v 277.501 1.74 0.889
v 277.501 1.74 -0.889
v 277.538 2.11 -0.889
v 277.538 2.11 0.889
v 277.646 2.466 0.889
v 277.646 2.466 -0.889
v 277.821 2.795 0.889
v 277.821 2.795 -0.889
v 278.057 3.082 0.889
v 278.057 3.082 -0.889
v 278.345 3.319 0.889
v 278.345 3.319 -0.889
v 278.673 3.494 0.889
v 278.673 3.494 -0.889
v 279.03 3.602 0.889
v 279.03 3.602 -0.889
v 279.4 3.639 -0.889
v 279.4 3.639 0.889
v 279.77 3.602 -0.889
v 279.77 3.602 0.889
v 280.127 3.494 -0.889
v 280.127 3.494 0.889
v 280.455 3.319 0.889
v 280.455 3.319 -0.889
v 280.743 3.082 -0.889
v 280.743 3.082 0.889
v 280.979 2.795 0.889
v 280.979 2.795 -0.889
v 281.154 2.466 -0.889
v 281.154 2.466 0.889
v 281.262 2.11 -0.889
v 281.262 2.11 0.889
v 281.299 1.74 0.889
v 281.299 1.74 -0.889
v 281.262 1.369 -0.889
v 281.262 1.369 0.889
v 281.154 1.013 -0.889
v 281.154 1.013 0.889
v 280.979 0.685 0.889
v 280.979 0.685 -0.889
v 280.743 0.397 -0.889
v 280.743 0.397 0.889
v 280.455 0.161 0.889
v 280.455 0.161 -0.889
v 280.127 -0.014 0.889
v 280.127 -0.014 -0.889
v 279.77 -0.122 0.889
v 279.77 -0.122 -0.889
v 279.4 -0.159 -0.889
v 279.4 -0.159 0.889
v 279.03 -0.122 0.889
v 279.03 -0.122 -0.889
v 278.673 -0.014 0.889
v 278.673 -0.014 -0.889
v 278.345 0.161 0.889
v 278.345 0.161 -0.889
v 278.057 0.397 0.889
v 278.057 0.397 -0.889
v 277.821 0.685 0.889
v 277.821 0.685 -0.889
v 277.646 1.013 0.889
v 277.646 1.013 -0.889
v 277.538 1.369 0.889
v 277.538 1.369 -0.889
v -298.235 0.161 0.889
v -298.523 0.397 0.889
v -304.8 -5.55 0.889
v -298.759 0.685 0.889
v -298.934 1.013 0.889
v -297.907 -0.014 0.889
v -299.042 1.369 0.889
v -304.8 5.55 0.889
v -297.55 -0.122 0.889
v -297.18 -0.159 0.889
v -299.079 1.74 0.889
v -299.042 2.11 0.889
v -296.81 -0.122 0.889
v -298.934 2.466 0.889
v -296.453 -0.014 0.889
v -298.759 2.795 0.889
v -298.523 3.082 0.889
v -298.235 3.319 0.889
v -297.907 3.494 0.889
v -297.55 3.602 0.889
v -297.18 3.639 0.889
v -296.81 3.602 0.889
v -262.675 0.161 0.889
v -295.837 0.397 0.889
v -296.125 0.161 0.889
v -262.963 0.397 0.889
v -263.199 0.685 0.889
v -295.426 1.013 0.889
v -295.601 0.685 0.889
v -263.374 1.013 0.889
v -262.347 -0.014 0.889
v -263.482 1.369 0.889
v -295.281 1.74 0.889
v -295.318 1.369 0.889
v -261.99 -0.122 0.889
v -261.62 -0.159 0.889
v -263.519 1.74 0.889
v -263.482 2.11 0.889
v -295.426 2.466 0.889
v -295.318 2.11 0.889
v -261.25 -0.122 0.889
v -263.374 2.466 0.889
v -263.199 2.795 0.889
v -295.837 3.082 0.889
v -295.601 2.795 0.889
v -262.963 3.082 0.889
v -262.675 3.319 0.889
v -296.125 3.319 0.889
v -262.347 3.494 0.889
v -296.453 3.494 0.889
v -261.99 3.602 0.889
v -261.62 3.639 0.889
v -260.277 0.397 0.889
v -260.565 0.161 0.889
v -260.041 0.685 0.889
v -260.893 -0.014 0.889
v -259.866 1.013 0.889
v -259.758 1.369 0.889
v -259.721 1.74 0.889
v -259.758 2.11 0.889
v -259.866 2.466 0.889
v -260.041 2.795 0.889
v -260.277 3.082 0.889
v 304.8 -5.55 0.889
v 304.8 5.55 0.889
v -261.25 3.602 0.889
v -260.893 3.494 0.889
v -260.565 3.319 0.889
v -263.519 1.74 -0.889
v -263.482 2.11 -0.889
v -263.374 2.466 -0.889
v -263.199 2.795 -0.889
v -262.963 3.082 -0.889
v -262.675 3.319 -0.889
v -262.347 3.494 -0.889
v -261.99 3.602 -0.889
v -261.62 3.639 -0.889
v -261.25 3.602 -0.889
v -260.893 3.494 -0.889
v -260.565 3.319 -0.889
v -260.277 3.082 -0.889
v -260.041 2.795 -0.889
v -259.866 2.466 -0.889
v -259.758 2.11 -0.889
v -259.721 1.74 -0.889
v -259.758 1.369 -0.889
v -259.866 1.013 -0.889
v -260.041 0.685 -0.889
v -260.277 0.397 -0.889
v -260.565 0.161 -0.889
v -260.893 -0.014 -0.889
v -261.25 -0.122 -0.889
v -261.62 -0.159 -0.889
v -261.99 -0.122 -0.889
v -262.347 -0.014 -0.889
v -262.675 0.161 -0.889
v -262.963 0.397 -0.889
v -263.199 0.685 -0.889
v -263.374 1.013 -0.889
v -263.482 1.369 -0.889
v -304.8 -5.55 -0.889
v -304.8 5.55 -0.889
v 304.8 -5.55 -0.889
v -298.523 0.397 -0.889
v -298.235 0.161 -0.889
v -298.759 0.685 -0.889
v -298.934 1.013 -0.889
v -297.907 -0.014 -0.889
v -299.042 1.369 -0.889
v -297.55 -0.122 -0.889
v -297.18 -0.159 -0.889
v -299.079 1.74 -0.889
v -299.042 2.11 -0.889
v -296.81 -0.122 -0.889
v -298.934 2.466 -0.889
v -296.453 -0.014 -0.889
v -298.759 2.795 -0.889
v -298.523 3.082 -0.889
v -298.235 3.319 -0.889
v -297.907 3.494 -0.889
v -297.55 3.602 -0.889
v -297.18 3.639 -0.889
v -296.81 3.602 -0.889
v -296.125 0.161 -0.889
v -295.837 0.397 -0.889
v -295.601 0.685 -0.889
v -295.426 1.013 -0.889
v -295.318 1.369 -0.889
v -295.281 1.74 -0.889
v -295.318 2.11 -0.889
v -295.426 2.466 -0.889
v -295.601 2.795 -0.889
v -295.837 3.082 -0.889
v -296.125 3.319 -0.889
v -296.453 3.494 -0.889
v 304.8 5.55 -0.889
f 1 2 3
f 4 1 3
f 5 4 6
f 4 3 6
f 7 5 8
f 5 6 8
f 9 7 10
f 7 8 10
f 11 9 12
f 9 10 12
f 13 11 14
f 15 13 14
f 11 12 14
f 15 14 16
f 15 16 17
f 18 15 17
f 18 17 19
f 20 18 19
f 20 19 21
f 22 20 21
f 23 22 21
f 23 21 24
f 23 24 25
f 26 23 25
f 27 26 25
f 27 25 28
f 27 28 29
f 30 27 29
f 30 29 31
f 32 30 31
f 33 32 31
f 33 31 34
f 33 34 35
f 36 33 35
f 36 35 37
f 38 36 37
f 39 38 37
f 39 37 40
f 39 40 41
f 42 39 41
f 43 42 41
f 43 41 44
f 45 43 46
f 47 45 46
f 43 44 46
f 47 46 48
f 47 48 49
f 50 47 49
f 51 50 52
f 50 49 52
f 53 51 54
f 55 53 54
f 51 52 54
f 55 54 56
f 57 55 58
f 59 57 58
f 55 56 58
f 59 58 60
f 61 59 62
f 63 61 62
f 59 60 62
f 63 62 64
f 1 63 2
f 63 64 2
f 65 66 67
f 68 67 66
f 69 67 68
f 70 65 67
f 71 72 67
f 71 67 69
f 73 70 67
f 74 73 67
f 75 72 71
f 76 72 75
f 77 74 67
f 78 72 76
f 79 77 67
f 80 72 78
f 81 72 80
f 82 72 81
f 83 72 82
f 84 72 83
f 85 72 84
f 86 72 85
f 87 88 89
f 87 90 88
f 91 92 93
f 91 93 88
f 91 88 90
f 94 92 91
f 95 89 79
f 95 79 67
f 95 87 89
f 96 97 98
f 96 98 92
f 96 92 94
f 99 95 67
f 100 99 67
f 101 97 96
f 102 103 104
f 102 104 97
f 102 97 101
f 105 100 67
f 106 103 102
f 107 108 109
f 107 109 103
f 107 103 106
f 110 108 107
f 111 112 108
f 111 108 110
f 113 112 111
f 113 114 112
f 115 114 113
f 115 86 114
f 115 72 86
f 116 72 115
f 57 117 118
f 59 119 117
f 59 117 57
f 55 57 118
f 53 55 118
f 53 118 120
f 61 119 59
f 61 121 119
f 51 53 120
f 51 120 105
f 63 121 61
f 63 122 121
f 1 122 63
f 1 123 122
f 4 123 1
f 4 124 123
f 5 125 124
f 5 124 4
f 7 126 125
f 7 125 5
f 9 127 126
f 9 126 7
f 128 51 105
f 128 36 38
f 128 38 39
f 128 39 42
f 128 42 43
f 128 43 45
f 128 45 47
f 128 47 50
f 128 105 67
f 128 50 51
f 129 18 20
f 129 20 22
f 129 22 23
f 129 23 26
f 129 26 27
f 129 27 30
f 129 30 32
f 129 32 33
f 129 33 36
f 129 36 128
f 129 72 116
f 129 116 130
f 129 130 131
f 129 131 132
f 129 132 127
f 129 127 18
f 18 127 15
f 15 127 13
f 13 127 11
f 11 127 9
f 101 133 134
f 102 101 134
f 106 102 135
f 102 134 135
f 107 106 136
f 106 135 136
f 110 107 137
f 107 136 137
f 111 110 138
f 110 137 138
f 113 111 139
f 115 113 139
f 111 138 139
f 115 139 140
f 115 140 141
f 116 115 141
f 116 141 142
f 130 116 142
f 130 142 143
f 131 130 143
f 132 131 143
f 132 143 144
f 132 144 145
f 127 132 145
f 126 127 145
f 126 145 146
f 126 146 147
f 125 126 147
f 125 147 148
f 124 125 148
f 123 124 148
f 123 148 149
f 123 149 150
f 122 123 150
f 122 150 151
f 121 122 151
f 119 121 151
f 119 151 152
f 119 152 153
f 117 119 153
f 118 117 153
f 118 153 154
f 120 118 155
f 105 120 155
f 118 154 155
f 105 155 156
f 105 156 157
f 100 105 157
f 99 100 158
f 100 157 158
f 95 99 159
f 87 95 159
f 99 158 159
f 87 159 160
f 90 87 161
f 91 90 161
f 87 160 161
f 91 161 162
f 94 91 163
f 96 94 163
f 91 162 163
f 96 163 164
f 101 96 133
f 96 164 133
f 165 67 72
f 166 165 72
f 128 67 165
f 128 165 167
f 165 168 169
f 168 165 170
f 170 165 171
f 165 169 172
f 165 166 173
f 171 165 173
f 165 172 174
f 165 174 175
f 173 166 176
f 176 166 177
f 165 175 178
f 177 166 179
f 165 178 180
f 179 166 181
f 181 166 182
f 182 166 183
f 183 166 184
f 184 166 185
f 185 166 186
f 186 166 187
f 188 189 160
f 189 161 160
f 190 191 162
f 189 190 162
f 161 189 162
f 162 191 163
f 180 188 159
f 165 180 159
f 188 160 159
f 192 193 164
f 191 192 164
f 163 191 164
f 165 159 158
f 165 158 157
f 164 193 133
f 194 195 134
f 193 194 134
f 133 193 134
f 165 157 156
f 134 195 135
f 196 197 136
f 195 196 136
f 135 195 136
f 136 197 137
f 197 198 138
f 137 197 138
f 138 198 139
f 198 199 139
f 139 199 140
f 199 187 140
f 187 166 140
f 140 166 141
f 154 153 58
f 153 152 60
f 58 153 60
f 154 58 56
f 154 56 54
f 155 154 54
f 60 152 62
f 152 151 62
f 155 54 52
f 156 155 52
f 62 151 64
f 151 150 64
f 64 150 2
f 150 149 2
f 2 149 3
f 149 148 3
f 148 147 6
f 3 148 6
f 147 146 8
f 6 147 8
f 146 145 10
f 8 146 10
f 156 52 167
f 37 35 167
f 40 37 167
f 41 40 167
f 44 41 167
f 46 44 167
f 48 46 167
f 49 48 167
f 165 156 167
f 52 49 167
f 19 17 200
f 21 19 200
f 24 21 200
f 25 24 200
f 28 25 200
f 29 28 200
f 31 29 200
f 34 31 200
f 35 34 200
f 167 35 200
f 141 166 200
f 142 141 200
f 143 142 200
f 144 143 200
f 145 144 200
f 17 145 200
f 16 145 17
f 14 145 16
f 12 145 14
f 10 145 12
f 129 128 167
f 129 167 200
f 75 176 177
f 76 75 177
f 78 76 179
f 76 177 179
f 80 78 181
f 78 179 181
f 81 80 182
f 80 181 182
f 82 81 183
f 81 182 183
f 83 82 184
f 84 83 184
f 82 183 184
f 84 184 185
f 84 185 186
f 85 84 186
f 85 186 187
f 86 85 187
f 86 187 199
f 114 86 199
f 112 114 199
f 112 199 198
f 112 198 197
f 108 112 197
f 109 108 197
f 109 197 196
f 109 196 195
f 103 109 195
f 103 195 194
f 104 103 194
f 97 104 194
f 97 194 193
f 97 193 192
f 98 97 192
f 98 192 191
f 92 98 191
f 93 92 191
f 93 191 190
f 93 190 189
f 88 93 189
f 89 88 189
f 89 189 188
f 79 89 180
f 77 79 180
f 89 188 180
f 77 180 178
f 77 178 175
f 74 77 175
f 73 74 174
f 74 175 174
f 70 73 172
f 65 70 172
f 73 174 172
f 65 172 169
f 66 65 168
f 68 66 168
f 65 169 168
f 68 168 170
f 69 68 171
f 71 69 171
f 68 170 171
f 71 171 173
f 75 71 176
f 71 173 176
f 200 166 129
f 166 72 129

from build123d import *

# Parameters (mm, degrees)
SKETCH1_W             = 609.6
SKETCH1_H             = 11.0998
BOSS_EXTRUDE1_DEPTH   = 0.889
F_6_CLEARANCE_HOLE1_D = 3.7973


with BuildPart() as part:
    # Sketch1 → Boss-Extrude1 (new body, symmetric)
    with BuildSketch(Plane.XY):
        Rectangle(SKETCH1_W, SKETCH1_H)
    extrude(amount=BOSS_EXTRUDE1_DEPTH, both=True)

    # #6 Clearance Hole1 (through all)
    with Locations(Plane.XY.offset(0.889)):
        with Locations((-297.18, 1.7399), (-261.62, 1.7399), (279.4, 1.7399)):
            Hole(F_6_CLEARANCE_HOLE1_D / 2)


solid = part.part
